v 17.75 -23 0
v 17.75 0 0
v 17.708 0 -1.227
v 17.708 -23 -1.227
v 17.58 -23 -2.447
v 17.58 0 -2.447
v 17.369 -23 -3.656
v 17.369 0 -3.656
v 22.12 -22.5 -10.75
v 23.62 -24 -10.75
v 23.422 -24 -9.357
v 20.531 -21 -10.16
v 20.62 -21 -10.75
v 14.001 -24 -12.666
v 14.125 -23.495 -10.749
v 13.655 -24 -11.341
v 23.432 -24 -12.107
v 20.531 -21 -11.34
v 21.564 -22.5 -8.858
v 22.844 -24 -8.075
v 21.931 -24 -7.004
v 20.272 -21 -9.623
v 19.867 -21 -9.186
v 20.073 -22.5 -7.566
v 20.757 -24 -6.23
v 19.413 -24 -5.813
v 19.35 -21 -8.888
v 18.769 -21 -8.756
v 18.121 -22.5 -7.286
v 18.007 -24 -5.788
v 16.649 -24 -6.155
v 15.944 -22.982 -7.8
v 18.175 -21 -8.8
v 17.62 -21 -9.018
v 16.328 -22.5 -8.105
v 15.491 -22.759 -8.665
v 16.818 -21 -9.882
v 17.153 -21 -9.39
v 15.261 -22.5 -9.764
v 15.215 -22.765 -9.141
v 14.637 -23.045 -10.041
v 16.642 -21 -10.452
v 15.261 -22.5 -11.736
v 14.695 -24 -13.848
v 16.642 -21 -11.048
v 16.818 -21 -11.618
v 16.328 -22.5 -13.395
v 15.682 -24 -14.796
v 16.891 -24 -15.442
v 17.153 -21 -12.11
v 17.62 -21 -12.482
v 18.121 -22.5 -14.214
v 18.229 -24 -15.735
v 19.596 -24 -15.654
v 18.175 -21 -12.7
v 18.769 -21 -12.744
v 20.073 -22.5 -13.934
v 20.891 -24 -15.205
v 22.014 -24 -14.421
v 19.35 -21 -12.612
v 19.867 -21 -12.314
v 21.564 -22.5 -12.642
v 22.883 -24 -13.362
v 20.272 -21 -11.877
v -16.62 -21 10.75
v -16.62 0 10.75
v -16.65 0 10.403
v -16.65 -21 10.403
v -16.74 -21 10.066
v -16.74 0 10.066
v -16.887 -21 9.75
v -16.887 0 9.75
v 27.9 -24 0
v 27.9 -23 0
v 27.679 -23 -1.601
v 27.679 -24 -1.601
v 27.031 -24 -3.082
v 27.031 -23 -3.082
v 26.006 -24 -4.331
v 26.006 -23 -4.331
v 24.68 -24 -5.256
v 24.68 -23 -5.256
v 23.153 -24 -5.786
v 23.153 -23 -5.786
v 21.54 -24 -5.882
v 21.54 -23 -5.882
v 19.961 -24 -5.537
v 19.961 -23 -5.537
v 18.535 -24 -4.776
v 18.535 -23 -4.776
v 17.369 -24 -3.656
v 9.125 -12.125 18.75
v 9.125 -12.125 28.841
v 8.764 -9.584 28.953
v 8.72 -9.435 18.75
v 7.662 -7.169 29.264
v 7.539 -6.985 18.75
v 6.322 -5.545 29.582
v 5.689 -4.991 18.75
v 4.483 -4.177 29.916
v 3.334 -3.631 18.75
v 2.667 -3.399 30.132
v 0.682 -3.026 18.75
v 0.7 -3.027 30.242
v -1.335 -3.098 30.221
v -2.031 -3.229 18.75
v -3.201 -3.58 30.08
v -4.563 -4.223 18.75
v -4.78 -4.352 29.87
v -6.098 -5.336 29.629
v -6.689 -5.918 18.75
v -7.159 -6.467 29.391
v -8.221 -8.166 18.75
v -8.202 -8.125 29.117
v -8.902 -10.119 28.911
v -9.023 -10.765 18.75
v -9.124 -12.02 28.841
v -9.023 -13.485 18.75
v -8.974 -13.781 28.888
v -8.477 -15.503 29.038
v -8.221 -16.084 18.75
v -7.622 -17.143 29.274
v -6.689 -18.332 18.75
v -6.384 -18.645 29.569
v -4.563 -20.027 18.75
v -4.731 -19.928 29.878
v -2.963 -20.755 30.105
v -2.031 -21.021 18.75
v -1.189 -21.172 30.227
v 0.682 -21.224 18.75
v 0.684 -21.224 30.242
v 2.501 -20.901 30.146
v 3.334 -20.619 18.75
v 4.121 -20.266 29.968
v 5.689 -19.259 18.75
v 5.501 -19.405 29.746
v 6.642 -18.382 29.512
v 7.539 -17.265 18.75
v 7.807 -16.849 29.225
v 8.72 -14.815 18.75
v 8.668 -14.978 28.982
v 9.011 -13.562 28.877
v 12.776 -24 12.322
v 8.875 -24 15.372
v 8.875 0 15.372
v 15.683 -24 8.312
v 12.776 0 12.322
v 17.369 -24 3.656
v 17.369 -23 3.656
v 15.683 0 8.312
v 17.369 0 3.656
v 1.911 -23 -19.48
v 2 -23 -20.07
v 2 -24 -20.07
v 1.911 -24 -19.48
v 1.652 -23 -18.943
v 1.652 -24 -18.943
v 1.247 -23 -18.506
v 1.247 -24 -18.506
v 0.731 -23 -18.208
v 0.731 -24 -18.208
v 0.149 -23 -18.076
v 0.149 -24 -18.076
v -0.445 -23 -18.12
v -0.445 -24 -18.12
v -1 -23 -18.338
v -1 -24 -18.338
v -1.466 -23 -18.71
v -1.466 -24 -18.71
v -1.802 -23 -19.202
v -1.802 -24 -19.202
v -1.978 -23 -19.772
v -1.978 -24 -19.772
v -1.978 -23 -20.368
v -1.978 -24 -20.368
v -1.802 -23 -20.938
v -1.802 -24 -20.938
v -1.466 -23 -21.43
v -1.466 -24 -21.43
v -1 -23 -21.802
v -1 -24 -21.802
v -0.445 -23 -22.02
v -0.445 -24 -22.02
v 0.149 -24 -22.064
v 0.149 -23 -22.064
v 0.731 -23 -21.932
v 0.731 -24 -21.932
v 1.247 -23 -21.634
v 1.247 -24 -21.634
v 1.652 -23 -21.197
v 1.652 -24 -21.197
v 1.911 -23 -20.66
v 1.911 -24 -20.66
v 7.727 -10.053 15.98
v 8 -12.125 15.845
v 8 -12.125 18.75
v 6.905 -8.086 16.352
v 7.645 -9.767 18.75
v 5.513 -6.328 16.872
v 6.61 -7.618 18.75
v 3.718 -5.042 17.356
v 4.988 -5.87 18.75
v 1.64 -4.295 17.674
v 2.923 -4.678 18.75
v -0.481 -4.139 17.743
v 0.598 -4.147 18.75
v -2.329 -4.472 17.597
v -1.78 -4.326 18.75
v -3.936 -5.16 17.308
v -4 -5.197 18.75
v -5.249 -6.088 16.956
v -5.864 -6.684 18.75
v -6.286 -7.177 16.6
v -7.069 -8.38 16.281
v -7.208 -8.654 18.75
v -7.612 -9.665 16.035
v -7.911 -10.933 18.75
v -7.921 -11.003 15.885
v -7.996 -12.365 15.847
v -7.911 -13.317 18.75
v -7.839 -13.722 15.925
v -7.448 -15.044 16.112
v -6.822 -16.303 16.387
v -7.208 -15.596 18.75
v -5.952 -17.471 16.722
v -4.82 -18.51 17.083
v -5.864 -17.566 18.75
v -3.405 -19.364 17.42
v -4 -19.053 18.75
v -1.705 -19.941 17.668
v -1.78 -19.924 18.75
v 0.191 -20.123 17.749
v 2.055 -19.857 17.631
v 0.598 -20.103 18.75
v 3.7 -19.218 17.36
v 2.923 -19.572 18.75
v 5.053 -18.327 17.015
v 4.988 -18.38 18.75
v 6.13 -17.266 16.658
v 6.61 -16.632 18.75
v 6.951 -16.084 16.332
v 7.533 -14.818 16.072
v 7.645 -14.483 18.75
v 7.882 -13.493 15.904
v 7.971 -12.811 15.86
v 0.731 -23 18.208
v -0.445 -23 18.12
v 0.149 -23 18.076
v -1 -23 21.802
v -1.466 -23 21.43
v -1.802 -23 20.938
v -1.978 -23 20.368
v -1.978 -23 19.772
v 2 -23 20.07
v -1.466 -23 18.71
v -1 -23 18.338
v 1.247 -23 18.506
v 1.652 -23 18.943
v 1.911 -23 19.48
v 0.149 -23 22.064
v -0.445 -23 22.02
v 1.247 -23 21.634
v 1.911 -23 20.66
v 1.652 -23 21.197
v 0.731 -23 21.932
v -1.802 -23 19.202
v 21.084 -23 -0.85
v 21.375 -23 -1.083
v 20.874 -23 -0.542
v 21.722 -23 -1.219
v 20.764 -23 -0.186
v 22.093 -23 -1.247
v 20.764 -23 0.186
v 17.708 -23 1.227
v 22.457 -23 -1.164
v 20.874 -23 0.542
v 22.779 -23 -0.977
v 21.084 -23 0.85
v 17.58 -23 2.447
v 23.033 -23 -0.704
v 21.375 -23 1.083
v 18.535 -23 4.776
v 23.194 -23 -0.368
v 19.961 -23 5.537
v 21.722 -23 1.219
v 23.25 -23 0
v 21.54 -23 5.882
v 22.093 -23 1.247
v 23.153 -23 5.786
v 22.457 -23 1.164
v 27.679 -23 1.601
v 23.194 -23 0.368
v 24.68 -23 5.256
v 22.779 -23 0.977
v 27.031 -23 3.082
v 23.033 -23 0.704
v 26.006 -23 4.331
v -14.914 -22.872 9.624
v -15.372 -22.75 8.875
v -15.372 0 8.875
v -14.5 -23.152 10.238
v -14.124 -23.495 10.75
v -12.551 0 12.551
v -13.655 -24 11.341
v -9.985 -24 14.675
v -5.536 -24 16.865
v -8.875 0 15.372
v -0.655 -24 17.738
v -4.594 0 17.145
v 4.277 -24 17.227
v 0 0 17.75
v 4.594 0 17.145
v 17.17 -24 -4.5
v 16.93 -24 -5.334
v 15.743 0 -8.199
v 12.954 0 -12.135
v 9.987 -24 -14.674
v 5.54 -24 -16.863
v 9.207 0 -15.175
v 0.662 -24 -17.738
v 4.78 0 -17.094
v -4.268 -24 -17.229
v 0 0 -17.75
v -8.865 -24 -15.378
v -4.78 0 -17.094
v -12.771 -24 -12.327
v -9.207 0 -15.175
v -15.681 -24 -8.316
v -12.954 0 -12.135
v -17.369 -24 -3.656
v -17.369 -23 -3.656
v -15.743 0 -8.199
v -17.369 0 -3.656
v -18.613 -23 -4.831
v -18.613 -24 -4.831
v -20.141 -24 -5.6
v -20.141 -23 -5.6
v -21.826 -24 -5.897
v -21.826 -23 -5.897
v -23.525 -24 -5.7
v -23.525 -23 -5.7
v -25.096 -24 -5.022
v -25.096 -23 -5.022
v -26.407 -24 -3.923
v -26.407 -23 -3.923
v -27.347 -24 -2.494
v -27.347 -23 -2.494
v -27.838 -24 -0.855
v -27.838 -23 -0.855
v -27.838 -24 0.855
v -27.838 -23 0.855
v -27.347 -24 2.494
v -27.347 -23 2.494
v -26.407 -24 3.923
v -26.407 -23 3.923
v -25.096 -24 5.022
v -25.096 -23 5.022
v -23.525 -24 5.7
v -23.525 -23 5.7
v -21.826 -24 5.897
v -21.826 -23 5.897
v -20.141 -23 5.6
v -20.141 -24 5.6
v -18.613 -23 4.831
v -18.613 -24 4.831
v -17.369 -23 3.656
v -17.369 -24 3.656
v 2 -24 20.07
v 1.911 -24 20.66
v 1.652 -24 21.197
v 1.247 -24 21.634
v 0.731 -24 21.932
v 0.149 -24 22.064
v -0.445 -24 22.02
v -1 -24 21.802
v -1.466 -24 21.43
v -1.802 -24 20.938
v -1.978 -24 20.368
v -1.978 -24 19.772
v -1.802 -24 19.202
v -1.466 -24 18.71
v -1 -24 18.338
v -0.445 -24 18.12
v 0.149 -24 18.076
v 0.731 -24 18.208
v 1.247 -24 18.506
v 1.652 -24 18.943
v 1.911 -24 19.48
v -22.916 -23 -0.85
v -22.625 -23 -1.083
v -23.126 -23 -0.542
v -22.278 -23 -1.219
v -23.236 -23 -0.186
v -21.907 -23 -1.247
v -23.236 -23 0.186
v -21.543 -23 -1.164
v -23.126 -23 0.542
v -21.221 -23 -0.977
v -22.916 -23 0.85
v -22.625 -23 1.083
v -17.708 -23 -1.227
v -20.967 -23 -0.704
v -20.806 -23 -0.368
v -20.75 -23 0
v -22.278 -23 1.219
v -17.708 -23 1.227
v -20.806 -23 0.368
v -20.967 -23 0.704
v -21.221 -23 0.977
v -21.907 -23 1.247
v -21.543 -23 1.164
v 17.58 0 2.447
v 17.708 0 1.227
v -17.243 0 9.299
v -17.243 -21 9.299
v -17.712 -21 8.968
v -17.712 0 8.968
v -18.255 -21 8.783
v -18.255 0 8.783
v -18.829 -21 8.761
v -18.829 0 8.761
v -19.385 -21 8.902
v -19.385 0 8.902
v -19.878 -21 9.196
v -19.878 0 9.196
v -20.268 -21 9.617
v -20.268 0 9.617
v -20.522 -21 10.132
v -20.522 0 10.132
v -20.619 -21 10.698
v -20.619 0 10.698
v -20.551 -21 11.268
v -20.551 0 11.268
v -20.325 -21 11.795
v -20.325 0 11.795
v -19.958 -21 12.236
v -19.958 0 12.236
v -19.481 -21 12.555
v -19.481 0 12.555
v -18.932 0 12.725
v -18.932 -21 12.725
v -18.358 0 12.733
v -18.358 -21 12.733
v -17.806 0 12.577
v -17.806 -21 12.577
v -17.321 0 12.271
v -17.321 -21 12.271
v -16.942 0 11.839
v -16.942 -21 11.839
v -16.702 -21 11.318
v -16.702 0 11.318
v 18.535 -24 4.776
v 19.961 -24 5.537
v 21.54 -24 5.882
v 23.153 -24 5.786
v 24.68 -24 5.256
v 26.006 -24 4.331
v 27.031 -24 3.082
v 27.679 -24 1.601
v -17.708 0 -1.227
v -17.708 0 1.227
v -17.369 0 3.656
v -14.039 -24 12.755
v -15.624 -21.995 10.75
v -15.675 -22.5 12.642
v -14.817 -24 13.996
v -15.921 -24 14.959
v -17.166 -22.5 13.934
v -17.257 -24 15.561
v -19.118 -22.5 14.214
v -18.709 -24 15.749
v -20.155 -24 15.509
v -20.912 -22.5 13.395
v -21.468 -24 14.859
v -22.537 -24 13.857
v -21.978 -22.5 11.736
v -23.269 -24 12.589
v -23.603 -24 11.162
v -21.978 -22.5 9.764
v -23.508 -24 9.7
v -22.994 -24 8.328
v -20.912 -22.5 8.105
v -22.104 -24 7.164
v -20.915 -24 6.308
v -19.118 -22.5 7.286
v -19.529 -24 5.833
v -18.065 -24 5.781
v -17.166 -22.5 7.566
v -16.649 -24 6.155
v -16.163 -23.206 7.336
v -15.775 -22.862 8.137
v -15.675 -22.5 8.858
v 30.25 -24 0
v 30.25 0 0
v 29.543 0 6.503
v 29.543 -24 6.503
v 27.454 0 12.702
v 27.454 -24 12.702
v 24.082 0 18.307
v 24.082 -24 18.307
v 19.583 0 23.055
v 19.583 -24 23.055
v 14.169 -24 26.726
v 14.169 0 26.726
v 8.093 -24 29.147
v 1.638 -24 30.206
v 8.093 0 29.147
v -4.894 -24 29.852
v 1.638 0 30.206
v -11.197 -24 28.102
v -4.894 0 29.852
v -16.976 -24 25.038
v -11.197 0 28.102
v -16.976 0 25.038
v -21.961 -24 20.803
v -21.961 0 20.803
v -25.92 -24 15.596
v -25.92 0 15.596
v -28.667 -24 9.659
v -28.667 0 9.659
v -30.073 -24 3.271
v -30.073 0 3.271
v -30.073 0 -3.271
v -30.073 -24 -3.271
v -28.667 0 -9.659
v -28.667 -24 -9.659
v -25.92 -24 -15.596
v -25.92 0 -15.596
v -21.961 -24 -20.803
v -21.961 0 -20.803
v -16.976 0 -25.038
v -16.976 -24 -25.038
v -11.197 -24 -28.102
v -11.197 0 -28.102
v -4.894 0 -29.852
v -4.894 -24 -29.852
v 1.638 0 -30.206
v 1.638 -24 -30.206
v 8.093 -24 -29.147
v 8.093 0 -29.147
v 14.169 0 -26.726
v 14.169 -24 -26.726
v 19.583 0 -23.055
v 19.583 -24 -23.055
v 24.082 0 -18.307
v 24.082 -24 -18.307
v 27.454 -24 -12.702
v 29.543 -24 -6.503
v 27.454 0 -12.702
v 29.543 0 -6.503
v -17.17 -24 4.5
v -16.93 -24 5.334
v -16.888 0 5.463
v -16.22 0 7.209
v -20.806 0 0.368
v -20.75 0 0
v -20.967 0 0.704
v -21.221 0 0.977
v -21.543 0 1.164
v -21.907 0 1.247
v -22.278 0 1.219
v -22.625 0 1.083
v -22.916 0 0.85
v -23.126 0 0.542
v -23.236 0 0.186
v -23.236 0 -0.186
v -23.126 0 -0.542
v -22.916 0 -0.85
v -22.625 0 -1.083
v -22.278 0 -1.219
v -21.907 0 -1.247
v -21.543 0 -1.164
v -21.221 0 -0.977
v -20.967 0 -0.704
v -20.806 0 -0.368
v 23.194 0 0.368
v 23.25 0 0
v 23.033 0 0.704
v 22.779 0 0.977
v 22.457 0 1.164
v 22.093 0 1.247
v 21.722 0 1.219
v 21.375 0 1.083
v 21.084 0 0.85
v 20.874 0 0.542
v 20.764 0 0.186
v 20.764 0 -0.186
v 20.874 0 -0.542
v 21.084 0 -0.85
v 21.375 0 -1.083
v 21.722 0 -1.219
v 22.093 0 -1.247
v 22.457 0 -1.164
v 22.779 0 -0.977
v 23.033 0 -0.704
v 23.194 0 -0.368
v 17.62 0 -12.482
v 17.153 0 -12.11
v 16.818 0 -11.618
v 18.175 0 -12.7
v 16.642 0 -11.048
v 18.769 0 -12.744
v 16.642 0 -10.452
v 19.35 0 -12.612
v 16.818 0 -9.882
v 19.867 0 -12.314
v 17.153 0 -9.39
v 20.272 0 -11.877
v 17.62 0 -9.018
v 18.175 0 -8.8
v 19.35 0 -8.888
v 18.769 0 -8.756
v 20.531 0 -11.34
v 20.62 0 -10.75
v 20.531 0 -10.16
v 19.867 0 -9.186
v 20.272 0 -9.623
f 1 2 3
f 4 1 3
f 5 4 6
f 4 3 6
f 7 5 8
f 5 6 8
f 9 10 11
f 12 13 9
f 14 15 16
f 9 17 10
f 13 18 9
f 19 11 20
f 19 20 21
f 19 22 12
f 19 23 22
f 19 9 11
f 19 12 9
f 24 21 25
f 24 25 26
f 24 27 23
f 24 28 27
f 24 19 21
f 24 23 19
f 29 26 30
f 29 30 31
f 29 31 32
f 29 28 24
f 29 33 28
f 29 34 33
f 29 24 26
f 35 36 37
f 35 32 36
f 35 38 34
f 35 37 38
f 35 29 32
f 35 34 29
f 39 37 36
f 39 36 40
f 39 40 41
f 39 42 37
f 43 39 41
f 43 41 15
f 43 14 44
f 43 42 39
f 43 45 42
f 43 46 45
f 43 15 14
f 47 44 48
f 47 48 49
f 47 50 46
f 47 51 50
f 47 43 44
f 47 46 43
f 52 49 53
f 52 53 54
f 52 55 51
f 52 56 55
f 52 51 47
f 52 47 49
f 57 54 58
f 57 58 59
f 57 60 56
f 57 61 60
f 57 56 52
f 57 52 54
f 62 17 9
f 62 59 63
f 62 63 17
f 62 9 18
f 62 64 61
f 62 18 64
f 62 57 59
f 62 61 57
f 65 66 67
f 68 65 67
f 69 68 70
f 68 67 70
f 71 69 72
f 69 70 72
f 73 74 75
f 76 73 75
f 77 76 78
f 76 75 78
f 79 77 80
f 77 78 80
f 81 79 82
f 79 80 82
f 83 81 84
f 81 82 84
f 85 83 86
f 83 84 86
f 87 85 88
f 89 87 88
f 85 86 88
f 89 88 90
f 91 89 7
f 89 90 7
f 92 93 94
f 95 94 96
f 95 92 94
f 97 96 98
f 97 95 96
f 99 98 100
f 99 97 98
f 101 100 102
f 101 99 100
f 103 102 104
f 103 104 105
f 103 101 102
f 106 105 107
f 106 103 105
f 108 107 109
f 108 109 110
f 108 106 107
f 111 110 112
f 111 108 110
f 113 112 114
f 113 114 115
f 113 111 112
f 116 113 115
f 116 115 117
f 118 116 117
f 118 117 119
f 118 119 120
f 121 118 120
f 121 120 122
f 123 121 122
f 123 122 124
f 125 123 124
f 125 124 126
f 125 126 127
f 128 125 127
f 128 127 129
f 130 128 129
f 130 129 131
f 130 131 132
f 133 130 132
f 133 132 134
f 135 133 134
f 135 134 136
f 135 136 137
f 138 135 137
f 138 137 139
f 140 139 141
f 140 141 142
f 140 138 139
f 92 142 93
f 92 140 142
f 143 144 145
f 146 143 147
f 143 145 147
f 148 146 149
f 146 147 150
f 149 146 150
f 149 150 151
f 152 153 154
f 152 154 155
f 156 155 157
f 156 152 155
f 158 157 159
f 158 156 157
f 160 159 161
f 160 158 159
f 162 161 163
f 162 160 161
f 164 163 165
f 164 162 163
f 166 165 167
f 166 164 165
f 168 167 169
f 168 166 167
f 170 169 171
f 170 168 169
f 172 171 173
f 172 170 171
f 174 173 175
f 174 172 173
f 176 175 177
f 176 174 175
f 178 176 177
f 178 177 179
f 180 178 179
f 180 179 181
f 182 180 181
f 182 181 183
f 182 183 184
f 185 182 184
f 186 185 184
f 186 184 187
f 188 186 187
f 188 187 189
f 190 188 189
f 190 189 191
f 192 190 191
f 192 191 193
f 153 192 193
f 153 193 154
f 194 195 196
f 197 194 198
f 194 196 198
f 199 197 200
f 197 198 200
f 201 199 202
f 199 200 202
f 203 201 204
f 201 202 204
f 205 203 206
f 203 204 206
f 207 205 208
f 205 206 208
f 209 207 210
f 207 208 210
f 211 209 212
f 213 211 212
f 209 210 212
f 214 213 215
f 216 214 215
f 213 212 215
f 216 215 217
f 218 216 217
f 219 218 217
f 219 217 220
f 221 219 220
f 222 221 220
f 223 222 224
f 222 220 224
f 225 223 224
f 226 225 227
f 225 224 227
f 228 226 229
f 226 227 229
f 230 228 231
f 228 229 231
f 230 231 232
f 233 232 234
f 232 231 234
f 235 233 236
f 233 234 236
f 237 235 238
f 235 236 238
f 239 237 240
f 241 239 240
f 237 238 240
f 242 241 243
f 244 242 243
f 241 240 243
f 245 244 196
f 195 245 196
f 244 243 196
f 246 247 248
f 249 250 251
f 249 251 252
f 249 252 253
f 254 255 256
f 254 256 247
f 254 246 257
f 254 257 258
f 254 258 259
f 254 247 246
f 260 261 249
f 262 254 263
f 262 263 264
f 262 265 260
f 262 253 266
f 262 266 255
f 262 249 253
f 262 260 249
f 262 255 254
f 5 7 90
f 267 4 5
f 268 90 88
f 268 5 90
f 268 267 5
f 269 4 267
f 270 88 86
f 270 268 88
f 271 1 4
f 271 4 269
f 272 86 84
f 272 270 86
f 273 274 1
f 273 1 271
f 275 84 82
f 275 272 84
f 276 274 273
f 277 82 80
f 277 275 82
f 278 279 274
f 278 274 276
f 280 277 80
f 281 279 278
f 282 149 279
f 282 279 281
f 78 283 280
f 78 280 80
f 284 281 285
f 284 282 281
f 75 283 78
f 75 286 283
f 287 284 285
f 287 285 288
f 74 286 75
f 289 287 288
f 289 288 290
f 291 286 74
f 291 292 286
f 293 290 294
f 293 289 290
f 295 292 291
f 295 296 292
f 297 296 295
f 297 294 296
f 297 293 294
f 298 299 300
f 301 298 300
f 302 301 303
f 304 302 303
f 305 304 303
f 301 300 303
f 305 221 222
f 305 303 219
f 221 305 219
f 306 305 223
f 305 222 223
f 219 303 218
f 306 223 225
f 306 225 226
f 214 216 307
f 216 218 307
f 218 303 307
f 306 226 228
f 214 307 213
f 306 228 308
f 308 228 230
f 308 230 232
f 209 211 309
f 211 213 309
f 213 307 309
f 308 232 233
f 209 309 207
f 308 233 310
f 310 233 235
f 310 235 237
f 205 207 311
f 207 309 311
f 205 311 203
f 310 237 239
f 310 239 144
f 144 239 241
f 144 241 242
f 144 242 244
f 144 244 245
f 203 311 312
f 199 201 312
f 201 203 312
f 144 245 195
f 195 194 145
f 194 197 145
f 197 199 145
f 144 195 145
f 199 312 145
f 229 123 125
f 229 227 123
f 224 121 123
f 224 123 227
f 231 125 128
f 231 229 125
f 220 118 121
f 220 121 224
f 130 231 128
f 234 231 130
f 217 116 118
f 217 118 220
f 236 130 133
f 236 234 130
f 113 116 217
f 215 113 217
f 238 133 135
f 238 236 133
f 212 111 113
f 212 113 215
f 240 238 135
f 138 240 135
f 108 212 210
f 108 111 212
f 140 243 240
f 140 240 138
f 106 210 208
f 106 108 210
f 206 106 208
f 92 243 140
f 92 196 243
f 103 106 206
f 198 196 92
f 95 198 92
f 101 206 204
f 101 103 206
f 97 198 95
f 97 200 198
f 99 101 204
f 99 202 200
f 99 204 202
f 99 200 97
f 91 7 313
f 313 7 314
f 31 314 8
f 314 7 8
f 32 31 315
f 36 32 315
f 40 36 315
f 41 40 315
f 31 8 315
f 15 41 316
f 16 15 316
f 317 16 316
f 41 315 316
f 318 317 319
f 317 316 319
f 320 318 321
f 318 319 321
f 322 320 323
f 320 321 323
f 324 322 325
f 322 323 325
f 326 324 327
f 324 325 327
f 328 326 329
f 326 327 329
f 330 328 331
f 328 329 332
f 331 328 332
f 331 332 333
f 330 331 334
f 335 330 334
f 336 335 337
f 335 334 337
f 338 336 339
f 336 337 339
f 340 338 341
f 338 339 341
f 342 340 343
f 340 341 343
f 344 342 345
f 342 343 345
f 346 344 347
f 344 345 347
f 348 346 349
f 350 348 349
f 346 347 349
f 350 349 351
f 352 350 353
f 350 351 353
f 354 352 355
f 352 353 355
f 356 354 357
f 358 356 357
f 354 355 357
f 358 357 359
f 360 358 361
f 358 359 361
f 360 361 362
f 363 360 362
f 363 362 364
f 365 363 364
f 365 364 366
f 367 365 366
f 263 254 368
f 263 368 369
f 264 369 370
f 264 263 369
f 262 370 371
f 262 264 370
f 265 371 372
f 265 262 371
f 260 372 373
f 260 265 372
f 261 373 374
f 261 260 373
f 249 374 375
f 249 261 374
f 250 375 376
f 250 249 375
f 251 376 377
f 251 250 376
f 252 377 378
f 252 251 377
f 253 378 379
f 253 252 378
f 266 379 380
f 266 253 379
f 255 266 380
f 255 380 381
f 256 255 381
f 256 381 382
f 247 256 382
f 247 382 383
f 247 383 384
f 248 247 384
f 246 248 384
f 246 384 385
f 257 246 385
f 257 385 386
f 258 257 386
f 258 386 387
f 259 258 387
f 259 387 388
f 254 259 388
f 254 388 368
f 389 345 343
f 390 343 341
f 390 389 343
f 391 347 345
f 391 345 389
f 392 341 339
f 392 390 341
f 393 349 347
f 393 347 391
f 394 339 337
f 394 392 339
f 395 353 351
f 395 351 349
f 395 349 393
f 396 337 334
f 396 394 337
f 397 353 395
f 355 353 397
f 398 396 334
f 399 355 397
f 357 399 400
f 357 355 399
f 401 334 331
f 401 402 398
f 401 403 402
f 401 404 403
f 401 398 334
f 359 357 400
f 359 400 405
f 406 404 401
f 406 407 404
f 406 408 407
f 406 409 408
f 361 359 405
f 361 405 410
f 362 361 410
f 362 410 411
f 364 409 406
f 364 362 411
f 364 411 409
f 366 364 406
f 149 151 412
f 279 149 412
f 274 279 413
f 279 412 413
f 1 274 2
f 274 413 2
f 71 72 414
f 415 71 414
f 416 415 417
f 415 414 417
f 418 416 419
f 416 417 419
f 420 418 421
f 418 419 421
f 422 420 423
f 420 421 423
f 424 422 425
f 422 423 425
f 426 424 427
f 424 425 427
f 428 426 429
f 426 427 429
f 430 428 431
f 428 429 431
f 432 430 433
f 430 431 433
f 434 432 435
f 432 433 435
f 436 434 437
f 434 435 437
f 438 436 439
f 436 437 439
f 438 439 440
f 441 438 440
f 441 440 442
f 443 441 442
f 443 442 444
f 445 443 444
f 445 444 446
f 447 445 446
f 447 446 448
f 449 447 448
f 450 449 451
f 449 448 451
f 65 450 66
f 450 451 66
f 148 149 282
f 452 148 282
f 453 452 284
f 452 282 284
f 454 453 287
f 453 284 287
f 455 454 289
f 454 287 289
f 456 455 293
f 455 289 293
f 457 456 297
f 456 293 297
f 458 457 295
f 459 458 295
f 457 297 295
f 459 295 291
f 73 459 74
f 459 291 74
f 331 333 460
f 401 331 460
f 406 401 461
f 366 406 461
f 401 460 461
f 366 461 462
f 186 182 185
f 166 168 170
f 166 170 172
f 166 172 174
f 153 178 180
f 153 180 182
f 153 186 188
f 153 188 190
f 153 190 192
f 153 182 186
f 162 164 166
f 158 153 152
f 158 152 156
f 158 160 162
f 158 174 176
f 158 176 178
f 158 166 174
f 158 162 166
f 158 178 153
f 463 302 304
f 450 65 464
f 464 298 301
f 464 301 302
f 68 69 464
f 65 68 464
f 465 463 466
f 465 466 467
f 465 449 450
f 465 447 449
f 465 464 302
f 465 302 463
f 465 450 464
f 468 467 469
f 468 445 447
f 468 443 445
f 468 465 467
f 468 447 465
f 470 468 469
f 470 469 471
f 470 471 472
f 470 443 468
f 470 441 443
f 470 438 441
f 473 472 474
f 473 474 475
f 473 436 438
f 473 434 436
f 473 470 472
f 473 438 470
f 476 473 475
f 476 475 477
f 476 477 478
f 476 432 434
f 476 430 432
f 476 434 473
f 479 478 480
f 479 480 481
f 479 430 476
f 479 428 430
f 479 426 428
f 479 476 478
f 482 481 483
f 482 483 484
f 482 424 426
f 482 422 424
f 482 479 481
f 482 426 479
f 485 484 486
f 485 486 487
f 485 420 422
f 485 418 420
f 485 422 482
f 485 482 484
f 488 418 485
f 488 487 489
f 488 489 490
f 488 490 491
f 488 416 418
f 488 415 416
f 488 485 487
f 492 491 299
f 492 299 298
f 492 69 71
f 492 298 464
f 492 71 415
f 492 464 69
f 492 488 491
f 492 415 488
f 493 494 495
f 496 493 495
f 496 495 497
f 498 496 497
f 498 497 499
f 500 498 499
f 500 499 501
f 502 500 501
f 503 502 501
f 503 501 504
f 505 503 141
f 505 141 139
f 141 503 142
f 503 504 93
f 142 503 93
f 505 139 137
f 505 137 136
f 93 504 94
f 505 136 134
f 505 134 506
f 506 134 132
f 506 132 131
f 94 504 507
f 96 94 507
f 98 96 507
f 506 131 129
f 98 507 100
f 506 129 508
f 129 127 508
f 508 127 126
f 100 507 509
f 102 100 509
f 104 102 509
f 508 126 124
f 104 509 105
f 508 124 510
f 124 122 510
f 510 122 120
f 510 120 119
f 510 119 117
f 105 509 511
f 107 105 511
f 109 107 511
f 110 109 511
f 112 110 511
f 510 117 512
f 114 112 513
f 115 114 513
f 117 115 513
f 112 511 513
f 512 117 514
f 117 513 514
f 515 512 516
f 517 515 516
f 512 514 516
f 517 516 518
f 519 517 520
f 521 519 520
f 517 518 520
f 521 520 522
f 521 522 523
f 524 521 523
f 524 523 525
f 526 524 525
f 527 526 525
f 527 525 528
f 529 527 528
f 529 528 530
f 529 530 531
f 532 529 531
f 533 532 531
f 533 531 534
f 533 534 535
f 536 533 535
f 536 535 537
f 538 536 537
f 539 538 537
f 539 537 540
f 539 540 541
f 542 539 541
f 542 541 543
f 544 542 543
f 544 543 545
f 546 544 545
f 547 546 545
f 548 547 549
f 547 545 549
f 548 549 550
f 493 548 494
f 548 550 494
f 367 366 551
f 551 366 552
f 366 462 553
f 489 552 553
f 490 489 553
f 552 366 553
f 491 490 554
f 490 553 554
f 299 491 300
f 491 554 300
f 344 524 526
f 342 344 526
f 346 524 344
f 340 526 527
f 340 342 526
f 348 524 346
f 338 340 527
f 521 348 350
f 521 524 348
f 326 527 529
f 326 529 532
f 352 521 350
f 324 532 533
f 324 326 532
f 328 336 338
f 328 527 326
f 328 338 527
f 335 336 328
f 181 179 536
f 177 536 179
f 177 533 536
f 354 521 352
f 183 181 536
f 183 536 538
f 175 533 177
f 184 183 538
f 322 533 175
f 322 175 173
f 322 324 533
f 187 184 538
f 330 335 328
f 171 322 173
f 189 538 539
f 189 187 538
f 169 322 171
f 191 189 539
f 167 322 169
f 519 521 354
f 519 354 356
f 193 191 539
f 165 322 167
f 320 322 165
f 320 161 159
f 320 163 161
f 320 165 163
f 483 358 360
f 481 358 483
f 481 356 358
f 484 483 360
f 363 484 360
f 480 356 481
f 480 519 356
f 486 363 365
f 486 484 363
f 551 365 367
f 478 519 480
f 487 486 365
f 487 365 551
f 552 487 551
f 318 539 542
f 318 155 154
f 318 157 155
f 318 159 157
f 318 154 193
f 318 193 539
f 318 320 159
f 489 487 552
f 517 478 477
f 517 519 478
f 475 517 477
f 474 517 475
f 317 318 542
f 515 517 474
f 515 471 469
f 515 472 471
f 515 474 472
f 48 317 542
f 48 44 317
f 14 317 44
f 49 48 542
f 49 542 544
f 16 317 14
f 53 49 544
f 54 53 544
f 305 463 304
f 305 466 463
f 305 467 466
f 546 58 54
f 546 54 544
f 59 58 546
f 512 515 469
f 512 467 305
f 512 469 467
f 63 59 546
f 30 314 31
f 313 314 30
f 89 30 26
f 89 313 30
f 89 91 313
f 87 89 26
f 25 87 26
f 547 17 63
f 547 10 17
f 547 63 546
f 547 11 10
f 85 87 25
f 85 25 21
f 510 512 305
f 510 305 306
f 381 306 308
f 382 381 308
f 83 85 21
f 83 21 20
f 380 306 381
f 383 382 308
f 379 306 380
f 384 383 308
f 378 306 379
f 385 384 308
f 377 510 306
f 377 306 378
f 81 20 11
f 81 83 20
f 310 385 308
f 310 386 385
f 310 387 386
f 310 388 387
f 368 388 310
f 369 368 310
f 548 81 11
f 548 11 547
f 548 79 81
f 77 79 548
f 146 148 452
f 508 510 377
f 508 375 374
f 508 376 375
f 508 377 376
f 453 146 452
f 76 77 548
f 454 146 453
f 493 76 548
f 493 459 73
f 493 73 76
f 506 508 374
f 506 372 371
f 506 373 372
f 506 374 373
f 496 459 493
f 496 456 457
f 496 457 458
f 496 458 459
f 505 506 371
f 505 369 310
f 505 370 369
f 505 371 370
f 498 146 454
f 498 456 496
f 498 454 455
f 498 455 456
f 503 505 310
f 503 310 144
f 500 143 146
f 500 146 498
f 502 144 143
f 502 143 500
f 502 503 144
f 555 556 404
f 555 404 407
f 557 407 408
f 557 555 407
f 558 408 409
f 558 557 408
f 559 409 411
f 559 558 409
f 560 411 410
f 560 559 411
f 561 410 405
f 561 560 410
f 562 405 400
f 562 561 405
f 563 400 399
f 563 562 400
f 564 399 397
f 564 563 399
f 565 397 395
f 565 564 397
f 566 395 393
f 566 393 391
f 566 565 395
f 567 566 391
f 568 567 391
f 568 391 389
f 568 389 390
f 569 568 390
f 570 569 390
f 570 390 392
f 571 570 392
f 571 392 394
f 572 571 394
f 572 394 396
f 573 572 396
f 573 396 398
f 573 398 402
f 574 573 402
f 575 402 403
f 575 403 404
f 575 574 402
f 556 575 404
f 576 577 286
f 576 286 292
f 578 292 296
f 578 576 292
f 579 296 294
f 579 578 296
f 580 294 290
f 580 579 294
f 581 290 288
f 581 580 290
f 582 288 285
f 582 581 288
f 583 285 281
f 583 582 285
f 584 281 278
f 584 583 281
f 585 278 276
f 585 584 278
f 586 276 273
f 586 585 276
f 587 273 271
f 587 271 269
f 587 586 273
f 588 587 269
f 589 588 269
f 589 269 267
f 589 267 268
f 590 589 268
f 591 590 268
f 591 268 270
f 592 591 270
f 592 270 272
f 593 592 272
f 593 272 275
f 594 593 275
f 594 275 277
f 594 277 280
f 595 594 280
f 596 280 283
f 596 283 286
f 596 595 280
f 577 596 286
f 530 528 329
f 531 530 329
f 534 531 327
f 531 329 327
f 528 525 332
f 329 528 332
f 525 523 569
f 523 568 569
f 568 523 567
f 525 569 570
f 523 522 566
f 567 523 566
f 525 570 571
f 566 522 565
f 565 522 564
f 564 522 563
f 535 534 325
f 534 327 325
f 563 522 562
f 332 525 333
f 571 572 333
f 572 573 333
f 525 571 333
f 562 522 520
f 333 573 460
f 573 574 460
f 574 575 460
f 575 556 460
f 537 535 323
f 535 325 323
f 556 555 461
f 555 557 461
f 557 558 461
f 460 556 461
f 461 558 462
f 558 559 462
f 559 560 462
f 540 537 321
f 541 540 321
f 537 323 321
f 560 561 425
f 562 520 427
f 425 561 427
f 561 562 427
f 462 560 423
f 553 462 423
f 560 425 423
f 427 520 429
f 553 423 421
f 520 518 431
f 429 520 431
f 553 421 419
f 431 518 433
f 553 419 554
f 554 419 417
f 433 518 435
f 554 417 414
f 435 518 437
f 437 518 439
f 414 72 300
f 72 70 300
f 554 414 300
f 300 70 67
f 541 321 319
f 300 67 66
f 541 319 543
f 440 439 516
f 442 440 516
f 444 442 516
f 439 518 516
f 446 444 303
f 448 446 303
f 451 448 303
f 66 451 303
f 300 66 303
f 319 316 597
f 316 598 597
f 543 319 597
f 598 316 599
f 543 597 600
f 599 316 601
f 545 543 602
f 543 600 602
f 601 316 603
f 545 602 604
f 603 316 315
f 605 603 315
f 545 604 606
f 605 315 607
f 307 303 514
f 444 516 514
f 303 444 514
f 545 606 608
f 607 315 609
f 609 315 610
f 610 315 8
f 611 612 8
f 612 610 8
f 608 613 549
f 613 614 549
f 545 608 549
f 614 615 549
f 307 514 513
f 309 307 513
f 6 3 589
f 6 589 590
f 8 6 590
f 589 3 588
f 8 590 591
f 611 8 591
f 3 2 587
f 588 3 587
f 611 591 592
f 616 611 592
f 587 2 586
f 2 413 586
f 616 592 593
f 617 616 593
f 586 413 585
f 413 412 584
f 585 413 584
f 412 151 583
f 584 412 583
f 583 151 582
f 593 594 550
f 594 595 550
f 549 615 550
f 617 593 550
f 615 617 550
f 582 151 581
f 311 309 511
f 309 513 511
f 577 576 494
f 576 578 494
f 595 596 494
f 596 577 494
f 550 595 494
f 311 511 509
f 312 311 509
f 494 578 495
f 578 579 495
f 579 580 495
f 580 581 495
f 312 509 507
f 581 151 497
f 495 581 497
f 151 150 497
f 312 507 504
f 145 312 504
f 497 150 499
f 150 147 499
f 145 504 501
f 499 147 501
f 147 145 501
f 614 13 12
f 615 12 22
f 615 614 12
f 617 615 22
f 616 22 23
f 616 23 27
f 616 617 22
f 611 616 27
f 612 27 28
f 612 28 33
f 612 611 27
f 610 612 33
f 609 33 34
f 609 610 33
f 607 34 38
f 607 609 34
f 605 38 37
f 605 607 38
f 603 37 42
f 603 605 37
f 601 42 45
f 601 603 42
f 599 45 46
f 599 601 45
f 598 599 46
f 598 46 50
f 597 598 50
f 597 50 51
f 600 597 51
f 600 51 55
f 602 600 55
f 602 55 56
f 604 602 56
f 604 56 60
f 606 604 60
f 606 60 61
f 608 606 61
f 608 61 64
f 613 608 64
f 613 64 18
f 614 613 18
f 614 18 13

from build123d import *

# Parameters (mm, degrees)
F0_R     = 30.25
F0_R_2   = 2
F1_DEPTH = 24
F0_R_3   = 1.25
F2_DEPTH = 23
F5_R     = 9.125
F5_R_2   = 8
F6_DEPTH = 25
F7_DEPTH = 15


# Not quite as in the source:
# - a fillet or chamfer that OpenCascade refuses, or shapes differently, is made with other operations: its cross-section is extruded or revolved along the edge and cut away or added


with BuildPart() as f1:
    # F0 (on Front) → F1 (new body)
    with BuildSketch(Plane.XZ):
        Circle(F0_R)
        with Locations((0, -20.07)):
            Circle(F0_R_2, mode=Mode.SUBTRACT)
        with Locations((18.6195461814, -10.75)):
            Circle(F0_R_2, mode=Mode.SUBTRACT)
        with BuildLine():
            ThreePointArc((-16.6195461814, 10.75), (-16.6876945288, 10.2323619098), (-16.8874953738, 9.75))
            ThreePointArc((-16.8874953738, 9.75), (-20.5513978339, 11.2676380902), (-16.6195461814, 10.75))
        make_face(mode=Mode.SUBTRACT)
        with BuildLine():
            ThreePointArc((8.875, 15.3719509172), (14.3703479176, 10.4190019065), (17.369375, 3.6561334917))
            ThreePointArc((17.369375, 3.6561334917), (23.9351114309, 5.5736293158), (27.9, 0))
            ThreePointArc((27.9, 0), (23.9351114309, -5.5736293158), (17.369375, -3.6561334917))
            ThreePointArc((17.369375, -3.6561334917), (0, -17.75), (-17.369375, -3.6561334917))
            ThreePointArc((-17.369375, -3.6561334917), (-27.9, 0), (-17.369375, 3.6561334917))
            ThreePointArc((-17.369375, 3.6561334917), (-16.5773263107, 6.3446632999), (-15.3719509172, 8.875))
            ThreePointArc((-15.3719509172, 8.875), (-4.5940380506, 17.1451834166), (8.875, 15.3719509172))
        make_face(mode=Mode.SUBTRACT)
        with Locations((0, 20.07)):
            Circle(F0_R_2, mode=Mode.SUBTRACT)
    extrude(amount=F1_DEPTH)

    # F0 (on Front) → F2 (join)
    with BuildSketch(Plane.XZ):
        with BuildLine():
            ThreePointArc((-17.369375, 3.6561334917), (-27.9, 0), (-17.369375, -3.6561334917))
            ThreePointArc((-17.369375, -3.6561334917), (-17.75, 0), (-17.369375, 3.6561334917))
        make_face()
        with Locations((-22, 0)):
            Circle(F0_R_3, mode=Mode.SUBTRACT)
        with Locations((0, 20.07)):
            Circle(F0_R_2)
        with BuildLine():
            ThreePointArc((17.369375, 3.6561334917), (17.6545873111, 1.8379463744), (17.75, 0))
            ThreePointArc((17.75, 0), (17.6545873111, -1.8379463744), (17.369375, -3.6561334917))
            ThreePointArc((17.369375, -3.6561334917), (23.9351114309, -5.5736293158), (27.9, 0))
            ThreePointArc((27.9, 0), (23.9351114309, 5.5736293158), (17.369375, 3.6561334917))
        make_face()
        with Locations((22, 0)):
            Circle(F0_R_3, mode=Mode.SUBTRACT)
        with Locations((0, -20.07)):
            Circle(F0_R_2)
    extrude(amount=F2_DEPTH)

    # F3: chamfer of 3 on 2 edges, made by hand

    # F3_s1 → F3_t2 (revolve, cut)
    with BuildSketch(Plane.XY.offset(10.75)):
        Polygon((-13.6195461814, -24), (-16.6195461814, -21), (-16.6195461814, -24), align=None)
    revolve(axis=Axis((-18.6195461814, -24, 10.75), (0, -1, 0)), mode=Mode.SUBTRACT)

    # F3_s3 → F3_t4 (revolve, cut)
    with BuildSketch(Plane.XY.offset(-10.75)):
        Polygon((23.6195461814, -24), (20.6195461814, -21), (20.6195461814, -24), align=None)
    revolve(axis=Axis((18.6195461814, -24, -10.75), (0, -1, 0)), mode=Mode.SUBTRACT)

    # F5 (on offset) → F6 (cut)
    with BuildSketch(Plane.XY.offset(18.75)):
        with Locations((0, -12.125)):
            Circle(F5_R)
        with Locations((0, -12.125)):
            Circle(F5_R_2, mode=Mode.SUBTRACT)
    extrude(amount=F6_DEPTH, mode=Mode.SUBTRACT)

    # F5 (on offset) → F7 (cut, symmetric)
    with BuildSketch(Plane.XY.offset(18.75)):
        with Locations((0, -12.125)):
            Circle(F5_R_2)
    extrude(amount=F7_DEPTH, both=True, mode=Mode.SUBTRACT)


solid = f1.part
